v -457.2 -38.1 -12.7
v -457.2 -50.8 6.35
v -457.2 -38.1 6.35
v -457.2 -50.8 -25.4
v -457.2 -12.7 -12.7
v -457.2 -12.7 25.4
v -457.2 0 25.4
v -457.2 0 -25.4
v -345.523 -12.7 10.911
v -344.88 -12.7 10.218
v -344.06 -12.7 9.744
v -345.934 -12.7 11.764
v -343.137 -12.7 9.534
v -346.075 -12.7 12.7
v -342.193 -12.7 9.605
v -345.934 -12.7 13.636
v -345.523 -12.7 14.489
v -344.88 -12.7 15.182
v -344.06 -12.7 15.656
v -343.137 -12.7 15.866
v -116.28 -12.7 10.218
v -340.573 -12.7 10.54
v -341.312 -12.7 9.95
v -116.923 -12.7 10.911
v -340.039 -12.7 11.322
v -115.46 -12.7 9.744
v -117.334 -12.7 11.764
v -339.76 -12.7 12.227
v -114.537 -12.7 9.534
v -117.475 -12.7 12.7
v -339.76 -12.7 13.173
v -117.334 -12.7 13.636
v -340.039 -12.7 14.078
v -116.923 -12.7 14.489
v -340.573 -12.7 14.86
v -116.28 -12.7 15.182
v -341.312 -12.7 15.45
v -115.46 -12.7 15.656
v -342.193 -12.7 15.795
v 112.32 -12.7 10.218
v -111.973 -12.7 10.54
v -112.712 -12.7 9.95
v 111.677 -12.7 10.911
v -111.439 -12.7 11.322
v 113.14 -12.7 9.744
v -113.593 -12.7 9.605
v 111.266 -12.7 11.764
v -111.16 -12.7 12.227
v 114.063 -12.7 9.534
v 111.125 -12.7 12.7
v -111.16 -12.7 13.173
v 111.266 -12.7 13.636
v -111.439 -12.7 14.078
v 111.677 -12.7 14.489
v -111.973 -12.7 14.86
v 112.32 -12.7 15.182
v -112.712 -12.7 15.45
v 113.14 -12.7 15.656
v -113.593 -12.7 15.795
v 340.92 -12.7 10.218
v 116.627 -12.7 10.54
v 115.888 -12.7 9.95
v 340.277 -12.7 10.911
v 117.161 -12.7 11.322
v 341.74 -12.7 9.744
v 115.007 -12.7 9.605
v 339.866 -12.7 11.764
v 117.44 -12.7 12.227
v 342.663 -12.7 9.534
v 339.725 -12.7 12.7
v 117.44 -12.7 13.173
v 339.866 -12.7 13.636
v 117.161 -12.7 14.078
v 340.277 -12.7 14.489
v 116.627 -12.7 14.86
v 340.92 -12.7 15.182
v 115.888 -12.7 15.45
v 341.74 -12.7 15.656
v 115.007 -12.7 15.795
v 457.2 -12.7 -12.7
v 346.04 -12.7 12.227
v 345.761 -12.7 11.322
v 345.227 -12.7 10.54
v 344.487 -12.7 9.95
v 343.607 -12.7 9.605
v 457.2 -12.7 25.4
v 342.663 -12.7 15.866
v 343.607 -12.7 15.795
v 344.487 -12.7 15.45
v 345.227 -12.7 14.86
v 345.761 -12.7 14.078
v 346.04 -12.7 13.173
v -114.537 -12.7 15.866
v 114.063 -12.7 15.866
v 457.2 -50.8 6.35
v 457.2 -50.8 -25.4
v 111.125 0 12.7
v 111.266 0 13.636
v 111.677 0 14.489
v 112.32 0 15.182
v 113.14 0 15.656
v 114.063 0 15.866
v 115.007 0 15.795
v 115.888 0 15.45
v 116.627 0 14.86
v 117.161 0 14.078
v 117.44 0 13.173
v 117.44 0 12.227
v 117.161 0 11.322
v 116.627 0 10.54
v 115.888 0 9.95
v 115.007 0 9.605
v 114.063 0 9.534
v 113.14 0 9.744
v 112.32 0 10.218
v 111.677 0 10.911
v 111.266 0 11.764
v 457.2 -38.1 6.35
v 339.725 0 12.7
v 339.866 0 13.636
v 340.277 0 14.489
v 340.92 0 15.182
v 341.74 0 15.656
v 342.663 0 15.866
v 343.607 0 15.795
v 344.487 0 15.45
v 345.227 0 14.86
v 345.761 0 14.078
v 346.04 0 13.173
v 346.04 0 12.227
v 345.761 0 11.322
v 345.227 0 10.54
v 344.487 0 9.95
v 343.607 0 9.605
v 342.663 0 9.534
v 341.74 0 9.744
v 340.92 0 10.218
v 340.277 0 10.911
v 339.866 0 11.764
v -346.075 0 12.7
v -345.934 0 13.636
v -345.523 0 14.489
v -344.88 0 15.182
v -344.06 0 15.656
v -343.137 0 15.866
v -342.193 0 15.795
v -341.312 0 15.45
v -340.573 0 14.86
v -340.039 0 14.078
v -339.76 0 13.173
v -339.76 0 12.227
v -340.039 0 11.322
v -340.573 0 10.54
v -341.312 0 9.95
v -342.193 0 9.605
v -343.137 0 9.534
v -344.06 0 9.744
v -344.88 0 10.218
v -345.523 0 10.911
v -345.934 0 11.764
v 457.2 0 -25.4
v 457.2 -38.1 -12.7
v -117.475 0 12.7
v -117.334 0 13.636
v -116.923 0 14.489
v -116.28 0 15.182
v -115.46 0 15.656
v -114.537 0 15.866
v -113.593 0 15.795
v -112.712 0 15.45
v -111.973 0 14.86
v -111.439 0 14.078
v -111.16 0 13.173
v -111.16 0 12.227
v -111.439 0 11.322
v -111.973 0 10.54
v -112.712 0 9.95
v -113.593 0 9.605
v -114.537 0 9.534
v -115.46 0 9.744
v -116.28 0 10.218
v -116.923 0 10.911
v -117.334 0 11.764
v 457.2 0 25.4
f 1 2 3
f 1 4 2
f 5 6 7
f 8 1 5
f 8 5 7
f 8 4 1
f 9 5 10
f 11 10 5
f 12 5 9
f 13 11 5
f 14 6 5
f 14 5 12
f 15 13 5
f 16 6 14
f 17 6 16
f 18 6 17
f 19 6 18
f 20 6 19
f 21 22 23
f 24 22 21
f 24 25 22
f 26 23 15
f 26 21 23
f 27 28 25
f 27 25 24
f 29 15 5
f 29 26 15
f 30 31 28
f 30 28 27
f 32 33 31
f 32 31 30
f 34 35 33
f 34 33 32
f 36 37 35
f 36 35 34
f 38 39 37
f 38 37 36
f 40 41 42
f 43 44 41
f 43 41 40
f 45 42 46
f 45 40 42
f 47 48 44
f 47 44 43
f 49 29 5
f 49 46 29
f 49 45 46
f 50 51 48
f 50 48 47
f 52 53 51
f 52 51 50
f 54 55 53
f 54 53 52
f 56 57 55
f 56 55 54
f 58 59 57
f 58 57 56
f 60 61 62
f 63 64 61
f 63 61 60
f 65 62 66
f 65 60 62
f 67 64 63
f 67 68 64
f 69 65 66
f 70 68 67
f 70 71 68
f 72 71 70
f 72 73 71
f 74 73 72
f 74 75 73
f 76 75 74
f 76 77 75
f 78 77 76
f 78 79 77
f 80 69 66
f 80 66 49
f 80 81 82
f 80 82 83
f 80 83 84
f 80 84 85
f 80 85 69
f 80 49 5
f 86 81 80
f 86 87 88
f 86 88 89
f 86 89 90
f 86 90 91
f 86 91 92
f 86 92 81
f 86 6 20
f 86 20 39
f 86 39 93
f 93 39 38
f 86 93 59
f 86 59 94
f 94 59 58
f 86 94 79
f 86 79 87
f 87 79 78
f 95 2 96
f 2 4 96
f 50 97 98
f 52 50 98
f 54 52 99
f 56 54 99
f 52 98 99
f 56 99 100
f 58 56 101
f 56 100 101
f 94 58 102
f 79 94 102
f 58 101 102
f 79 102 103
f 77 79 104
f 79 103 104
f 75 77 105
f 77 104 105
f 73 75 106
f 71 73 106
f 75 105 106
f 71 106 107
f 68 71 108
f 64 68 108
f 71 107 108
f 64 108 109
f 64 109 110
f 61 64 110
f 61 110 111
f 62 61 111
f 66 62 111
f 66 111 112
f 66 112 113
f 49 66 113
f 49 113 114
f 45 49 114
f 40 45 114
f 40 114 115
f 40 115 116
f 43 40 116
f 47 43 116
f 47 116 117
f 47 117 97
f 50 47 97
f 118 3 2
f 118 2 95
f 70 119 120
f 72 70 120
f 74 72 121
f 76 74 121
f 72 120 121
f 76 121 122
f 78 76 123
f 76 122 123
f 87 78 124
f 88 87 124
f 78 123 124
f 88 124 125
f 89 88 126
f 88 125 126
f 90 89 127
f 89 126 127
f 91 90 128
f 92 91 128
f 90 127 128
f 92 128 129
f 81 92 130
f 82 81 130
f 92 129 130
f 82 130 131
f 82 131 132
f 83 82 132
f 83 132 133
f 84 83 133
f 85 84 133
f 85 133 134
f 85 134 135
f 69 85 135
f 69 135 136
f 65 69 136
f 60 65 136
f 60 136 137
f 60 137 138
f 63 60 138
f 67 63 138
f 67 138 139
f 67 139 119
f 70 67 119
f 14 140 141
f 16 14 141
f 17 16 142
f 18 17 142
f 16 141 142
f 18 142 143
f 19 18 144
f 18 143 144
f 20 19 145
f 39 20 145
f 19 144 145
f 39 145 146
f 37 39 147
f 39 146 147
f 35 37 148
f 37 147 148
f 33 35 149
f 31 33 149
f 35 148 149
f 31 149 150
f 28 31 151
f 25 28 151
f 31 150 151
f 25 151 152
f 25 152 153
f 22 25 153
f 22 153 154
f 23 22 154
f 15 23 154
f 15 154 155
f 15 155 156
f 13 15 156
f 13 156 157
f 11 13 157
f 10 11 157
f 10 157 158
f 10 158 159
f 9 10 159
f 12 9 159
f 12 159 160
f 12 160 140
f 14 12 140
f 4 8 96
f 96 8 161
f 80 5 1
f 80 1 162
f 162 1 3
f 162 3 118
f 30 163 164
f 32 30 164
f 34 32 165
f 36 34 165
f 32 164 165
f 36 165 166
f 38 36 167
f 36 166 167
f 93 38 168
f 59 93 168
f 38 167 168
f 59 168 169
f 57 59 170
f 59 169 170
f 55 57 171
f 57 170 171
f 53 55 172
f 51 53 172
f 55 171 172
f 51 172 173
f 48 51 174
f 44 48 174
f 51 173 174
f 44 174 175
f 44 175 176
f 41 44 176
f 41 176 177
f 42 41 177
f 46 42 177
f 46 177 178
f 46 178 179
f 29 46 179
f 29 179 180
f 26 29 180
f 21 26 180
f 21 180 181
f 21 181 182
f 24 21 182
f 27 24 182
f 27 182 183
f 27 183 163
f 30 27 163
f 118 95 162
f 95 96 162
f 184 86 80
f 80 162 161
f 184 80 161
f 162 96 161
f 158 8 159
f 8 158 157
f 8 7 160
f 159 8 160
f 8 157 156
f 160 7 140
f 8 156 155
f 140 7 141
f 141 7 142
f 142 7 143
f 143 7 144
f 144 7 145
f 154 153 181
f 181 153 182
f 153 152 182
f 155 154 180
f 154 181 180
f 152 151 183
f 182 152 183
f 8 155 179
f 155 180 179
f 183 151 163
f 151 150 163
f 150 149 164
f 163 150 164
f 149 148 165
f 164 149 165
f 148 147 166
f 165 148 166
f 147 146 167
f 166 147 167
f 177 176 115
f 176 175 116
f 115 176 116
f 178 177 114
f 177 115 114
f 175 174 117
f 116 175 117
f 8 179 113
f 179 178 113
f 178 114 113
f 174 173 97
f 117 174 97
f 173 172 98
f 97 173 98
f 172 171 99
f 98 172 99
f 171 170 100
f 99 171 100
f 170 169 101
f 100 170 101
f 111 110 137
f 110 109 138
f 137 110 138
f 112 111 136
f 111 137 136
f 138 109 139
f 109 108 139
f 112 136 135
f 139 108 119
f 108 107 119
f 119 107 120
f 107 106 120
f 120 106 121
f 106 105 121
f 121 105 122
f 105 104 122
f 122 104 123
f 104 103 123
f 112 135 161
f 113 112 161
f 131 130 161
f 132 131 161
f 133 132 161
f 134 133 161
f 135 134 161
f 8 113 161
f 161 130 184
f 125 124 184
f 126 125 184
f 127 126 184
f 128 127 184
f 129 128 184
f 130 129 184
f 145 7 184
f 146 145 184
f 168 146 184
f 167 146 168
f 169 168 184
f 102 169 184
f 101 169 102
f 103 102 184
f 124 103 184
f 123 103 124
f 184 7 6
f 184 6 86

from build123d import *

# Parameters (mm, degrees)
F0_W     = 914.4
F0_H     = 50.8
F1_DEPTH = 12.7
F2_W     = 914.4
F2_H     = 12.7
F3_DEPTH = 38.1
F4_W     = 914.4
F4_H     = 12.7
F5_DEPTH = 19.05
F7_D     = 6.35


with BuildPart() as f1:
    # F0 (on Front) → F1 (new body)
    with BuildSketch(Plane.XZ):
        Rectangle(F0_W, F0_H)
    extrude(amount=F1_DEPTH)

    # F2 (on face) → F3 (join)
    with BuildSketch(Plane.XZ.offset(12.7)):
        with Locations((0, -19.05)):
            Rectangle(F2_W, F2_H)
    extrude(amount=F3_DEPTH)

    # F4 (on face) → F5 (join)
    with BuildSketch(Plane.XY.offset(-12.7)):
        with Locations((0, -44.45)):
            Rectangle(F4_W, F4_H)
    extrude(amount=F5_DEPTH)

    # F7 (through all)
    with Locations(Plane.XZ.offset(12.7)):
        with Locations((-342.9, 12.7), (-114.3, 12.7), (114.3, 12.7), (342.9, 12.7)):
            Hole(F7_D / 2)


solid = f1.part
